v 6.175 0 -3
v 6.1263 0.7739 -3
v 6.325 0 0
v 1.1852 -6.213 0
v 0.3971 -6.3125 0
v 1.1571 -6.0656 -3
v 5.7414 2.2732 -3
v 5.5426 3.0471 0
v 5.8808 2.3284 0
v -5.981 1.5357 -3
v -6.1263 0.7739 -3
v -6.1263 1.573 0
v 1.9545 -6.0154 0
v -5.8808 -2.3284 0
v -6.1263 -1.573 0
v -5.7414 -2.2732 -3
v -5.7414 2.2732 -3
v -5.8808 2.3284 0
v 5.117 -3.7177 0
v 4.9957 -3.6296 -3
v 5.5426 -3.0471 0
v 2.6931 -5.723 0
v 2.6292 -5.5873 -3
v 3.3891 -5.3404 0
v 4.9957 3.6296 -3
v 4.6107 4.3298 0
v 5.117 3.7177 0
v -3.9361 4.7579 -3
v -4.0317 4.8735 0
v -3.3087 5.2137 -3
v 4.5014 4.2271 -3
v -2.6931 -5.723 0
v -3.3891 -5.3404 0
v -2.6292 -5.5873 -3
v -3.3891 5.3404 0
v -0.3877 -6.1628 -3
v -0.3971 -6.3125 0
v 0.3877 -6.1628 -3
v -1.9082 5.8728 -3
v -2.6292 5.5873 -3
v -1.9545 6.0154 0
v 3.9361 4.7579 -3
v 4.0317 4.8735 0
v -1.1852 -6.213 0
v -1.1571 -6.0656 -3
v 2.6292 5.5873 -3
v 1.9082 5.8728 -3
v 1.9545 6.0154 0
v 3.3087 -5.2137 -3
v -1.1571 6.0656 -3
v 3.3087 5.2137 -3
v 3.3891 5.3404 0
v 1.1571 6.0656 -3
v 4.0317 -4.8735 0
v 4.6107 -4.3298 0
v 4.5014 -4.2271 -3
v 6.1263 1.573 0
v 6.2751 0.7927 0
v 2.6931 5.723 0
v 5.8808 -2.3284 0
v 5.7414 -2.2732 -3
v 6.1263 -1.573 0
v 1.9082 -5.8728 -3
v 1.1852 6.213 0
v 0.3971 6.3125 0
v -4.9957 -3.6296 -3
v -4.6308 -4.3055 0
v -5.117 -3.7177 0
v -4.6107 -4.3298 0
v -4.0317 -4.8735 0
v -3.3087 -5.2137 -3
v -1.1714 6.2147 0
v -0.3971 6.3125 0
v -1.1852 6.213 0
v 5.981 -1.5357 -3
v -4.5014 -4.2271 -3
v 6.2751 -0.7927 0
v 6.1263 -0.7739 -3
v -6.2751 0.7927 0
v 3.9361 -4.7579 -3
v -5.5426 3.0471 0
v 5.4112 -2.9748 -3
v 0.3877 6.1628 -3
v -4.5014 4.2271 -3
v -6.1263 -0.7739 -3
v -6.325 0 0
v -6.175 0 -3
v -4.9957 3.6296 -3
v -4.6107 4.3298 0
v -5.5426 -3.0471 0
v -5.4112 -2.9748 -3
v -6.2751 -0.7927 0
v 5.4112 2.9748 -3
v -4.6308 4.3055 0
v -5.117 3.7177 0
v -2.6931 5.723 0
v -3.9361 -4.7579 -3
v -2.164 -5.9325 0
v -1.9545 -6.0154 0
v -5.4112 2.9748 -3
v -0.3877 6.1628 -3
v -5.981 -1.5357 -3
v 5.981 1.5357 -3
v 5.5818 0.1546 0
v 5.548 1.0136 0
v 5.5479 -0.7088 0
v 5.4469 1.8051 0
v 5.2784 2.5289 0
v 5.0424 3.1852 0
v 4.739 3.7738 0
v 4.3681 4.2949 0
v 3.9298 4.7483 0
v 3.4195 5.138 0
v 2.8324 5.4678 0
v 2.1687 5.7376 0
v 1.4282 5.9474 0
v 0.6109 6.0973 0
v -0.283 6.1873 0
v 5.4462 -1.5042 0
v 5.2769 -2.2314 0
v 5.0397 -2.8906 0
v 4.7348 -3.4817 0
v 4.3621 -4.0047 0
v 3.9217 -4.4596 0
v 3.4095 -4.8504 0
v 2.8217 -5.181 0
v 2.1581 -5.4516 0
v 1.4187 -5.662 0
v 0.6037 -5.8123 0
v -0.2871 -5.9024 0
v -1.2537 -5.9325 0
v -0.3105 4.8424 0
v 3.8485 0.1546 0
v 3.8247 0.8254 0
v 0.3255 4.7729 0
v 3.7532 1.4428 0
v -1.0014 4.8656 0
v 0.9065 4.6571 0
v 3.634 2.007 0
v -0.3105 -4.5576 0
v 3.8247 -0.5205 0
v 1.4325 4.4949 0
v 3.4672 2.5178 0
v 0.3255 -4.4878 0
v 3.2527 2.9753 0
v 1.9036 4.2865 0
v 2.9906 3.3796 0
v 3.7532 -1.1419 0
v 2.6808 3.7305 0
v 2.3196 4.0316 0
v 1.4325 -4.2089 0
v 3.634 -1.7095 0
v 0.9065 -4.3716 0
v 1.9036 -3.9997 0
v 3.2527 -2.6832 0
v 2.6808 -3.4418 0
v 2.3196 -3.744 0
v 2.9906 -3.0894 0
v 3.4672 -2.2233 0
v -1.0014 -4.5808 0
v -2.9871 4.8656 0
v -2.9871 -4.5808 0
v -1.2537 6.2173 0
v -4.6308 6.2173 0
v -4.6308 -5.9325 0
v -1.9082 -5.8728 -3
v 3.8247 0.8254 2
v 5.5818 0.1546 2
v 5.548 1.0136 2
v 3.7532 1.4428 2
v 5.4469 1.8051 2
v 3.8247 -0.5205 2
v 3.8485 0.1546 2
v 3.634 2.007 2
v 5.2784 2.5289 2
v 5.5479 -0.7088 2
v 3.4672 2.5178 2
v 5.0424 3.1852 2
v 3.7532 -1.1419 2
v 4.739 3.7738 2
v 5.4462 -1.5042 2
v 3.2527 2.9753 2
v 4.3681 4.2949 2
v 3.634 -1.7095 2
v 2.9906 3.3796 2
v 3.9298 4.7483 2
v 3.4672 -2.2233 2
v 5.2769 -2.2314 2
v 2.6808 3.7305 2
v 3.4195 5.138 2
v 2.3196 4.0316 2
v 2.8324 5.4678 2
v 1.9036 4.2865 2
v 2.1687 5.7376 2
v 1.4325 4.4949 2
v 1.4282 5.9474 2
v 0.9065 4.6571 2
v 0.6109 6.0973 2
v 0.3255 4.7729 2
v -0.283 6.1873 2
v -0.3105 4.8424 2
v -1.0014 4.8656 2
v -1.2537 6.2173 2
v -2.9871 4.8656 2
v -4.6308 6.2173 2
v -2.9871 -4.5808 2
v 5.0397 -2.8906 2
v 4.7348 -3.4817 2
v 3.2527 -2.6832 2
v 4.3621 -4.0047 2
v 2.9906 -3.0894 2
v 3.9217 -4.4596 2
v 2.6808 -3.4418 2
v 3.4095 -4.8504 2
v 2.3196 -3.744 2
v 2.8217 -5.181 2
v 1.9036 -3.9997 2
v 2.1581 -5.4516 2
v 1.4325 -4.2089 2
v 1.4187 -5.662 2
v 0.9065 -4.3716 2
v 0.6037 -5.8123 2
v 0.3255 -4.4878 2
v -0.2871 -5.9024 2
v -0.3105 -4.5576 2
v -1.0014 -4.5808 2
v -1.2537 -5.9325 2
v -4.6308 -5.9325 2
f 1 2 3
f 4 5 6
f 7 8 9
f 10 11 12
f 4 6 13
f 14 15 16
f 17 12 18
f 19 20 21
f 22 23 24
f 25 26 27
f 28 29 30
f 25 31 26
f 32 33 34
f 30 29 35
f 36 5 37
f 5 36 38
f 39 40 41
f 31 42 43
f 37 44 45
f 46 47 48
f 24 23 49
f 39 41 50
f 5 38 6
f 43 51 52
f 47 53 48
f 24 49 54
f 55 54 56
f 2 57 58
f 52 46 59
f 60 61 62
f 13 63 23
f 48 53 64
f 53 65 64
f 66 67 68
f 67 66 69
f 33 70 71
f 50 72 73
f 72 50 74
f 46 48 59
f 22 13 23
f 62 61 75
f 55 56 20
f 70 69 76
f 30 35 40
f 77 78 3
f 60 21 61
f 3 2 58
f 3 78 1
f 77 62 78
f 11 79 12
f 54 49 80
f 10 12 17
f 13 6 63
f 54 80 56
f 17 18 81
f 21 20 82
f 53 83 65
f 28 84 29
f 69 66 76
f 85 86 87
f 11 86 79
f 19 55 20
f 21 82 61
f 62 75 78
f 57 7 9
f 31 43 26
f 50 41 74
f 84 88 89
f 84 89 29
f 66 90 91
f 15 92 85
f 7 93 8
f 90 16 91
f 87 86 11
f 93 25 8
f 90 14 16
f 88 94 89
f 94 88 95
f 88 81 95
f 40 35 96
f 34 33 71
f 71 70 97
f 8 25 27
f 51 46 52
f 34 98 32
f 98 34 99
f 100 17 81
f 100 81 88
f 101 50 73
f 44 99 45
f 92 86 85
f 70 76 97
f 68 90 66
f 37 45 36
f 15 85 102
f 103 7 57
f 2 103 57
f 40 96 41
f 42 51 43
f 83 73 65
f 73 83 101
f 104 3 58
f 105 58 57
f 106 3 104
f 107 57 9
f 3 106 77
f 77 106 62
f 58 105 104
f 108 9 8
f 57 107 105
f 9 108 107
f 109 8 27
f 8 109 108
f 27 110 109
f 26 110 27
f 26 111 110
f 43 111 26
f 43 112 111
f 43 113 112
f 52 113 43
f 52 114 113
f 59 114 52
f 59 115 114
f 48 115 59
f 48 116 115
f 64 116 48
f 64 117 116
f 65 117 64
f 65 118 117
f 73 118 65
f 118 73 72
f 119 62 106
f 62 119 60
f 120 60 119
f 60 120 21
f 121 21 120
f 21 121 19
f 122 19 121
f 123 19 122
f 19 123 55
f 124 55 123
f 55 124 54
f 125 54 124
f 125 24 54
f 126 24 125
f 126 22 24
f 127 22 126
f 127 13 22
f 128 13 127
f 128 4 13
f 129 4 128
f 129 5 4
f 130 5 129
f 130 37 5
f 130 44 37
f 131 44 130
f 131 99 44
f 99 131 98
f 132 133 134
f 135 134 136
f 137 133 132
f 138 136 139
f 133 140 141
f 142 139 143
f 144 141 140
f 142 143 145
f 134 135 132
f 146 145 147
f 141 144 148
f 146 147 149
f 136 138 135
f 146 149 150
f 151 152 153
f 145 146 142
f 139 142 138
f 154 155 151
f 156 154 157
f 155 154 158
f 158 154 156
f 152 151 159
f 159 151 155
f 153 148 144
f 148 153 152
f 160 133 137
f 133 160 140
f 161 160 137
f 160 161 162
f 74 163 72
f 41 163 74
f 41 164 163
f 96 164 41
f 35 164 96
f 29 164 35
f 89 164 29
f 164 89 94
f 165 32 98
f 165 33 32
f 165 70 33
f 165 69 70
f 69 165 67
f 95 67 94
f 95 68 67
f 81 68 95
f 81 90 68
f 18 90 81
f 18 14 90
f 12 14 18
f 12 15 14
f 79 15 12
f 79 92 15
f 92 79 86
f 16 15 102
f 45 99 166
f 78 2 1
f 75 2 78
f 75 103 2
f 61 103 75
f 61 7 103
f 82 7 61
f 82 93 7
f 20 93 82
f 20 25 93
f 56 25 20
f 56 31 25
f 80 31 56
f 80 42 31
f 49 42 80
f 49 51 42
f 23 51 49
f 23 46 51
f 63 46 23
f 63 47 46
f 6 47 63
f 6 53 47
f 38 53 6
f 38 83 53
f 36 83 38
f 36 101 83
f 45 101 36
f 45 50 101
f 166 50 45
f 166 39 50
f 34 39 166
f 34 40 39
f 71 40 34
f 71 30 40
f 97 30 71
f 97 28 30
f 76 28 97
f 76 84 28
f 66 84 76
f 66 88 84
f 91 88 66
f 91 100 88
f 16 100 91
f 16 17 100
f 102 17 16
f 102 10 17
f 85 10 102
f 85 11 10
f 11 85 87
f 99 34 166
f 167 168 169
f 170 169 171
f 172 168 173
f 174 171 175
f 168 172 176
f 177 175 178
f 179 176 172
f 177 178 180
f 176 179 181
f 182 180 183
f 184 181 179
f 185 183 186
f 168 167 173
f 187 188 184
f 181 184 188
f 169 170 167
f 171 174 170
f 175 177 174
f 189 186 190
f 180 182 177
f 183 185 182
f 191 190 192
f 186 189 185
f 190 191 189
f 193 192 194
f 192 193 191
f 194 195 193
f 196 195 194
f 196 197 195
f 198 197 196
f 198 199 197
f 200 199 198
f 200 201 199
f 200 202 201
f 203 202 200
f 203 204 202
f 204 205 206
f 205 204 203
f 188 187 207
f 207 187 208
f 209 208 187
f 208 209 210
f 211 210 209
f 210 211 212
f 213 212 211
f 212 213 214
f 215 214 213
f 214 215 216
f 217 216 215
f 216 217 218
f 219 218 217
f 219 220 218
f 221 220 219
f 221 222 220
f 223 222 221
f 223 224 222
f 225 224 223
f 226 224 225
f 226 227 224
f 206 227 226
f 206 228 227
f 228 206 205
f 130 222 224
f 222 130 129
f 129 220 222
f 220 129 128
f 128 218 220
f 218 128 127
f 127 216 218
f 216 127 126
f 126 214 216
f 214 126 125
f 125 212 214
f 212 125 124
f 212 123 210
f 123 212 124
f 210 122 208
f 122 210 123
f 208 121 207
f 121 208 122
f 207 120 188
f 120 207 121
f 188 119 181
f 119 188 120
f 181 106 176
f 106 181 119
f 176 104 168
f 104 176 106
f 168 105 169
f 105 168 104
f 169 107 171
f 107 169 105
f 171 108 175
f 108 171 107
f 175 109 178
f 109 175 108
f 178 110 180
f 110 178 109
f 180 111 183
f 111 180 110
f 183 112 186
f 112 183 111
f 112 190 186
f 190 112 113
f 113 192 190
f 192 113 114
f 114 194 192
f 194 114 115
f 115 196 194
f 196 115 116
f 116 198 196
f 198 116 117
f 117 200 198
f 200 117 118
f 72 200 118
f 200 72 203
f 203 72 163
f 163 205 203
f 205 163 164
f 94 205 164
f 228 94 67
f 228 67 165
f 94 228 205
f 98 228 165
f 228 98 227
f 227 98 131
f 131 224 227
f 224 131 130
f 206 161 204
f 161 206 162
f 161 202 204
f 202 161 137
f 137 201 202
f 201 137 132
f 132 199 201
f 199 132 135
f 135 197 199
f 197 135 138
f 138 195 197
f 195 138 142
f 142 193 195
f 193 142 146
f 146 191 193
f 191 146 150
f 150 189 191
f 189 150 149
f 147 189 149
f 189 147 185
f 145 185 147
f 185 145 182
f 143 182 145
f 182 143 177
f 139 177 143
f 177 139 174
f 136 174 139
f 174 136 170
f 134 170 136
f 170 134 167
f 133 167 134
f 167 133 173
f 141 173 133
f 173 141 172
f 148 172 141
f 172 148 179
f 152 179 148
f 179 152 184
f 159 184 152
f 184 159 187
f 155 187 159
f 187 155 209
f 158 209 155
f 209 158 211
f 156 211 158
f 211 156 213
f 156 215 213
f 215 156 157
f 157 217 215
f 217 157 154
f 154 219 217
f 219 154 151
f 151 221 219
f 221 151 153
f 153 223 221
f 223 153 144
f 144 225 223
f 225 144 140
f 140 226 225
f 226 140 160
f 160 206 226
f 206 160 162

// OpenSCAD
$fn = 50;


difference() {
	union() {
		translate(v = [0, 0, -3.0000000000]) {
			cylinder(h = 3, r1 = 6.1750000000, r2 = 6.3250000000);
		}
		linear_extrude(height = 2) {
			text(font = "Impact", halign = "center", size = 12, text = "D", valign = "center");
		}
	}
	union();
}
